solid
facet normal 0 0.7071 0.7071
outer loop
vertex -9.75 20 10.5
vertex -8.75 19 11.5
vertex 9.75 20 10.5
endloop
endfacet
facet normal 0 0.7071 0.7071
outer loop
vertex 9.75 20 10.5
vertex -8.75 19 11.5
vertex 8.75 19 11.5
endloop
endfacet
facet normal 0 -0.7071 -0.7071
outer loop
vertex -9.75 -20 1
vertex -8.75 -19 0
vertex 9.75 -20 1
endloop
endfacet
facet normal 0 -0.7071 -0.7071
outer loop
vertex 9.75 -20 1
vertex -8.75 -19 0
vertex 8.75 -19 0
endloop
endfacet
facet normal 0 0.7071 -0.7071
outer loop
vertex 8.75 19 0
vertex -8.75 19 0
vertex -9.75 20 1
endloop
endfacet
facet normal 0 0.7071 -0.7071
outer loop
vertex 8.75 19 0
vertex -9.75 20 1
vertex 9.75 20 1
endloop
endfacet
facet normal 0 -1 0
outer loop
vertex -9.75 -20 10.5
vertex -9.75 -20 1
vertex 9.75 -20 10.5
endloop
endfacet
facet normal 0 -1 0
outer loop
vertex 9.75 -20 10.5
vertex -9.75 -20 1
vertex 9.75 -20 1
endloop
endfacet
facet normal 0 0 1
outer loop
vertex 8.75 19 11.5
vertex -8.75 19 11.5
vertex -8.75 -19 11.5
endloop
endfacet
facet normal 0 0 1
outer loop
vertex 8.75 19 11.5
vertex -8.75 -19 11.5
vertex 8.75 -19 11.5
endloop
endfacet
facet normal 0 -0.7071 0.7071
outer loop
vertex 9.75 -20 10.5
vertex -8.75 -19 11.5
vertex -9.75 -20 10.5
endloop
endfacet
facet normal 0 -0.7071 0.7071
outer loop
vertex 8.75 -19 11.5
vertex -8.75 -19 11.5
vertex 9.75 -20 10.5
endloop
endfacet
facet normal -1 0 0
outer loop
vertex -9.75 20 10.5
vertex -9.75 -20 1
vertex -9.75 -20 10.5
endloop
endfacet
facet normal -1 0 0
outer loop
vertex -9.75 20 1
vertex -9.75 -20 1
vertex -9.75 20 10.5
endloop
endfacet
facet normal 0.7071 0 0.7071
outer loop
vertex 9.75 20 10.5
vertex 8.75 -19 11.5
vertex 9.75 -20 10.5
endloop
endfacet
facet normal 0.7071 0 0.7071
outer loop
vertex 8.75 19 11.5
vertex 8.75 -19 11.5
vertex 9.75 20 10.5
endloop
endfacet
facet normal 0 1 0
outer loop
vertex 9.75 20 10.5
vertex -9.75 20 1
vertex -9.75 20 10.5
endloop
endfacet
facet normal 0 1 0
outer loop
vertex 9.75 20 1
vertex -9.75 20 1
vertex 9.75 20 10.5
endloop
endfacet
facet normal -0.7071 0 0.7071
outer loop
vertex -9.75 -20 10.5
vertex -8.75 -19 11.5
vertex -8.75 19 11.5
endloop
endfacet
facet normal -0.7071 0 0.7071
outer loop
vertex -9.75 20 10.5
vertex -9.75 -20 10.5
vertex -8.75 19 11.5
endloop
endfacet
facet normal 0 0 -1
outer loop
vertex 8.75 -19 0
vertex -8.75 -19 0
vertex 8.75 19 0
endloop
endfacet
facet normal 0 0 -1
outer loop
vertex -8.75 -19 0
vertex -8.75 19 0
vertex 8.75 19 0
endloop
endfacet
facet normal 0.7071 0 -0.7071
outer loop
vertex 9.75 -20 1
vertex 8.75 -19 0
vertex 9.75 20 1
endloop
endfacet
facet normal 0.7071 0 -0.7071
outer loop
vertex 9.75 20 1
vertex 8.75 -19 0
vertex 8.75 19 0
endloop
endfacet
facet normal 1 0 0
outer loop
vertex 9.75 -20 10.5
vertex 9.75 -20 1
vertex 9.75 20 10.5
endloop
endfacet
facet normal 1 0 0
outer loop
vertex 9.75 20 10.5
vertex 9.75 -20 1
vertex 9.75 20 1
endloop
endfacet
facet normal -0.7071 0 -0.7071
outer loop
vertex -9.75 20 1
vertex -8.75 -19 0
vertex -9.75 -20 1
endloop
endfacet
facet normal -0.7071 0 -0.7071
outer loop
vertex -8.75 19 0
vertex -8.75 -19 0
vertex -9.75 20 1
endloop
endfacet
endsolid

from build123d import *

# Parameters (mm, degrees)
SKETCH1_W           = 19.5
SKETCH1_H           = 40
BOSS_EXTRUDE1_DEPTH = 11.5
CHAMFER1_SIZE       = 1


with BuildPart() as part:
    # Sketch1 → Boss-Extrude1 (new body)
    with BuildSketch(Plane.XY):
        Rectangle(SKETCH1_W, SKETCH1_H)
    extrude(amount=BOSS_EXTRUDE1_DEPTH)

    # Chamfer1
    chamfer1_edges = [part.edges().sort_by_distance(p)[0] for p in [
        (-9.75, 0, 11.5),
        (0, -20, 11.5),
        (9.75, 0, 11.5),
        (0, -20, 0),
        (-9.75, 0, 0),
        (0, 20, 0),
        (9.75, 0, 0),
        (0, 20, 11.5),
    ]]
    chamfer(chamfer1_edges, length=CHAMFER1_SIZE)


solid = part.part
